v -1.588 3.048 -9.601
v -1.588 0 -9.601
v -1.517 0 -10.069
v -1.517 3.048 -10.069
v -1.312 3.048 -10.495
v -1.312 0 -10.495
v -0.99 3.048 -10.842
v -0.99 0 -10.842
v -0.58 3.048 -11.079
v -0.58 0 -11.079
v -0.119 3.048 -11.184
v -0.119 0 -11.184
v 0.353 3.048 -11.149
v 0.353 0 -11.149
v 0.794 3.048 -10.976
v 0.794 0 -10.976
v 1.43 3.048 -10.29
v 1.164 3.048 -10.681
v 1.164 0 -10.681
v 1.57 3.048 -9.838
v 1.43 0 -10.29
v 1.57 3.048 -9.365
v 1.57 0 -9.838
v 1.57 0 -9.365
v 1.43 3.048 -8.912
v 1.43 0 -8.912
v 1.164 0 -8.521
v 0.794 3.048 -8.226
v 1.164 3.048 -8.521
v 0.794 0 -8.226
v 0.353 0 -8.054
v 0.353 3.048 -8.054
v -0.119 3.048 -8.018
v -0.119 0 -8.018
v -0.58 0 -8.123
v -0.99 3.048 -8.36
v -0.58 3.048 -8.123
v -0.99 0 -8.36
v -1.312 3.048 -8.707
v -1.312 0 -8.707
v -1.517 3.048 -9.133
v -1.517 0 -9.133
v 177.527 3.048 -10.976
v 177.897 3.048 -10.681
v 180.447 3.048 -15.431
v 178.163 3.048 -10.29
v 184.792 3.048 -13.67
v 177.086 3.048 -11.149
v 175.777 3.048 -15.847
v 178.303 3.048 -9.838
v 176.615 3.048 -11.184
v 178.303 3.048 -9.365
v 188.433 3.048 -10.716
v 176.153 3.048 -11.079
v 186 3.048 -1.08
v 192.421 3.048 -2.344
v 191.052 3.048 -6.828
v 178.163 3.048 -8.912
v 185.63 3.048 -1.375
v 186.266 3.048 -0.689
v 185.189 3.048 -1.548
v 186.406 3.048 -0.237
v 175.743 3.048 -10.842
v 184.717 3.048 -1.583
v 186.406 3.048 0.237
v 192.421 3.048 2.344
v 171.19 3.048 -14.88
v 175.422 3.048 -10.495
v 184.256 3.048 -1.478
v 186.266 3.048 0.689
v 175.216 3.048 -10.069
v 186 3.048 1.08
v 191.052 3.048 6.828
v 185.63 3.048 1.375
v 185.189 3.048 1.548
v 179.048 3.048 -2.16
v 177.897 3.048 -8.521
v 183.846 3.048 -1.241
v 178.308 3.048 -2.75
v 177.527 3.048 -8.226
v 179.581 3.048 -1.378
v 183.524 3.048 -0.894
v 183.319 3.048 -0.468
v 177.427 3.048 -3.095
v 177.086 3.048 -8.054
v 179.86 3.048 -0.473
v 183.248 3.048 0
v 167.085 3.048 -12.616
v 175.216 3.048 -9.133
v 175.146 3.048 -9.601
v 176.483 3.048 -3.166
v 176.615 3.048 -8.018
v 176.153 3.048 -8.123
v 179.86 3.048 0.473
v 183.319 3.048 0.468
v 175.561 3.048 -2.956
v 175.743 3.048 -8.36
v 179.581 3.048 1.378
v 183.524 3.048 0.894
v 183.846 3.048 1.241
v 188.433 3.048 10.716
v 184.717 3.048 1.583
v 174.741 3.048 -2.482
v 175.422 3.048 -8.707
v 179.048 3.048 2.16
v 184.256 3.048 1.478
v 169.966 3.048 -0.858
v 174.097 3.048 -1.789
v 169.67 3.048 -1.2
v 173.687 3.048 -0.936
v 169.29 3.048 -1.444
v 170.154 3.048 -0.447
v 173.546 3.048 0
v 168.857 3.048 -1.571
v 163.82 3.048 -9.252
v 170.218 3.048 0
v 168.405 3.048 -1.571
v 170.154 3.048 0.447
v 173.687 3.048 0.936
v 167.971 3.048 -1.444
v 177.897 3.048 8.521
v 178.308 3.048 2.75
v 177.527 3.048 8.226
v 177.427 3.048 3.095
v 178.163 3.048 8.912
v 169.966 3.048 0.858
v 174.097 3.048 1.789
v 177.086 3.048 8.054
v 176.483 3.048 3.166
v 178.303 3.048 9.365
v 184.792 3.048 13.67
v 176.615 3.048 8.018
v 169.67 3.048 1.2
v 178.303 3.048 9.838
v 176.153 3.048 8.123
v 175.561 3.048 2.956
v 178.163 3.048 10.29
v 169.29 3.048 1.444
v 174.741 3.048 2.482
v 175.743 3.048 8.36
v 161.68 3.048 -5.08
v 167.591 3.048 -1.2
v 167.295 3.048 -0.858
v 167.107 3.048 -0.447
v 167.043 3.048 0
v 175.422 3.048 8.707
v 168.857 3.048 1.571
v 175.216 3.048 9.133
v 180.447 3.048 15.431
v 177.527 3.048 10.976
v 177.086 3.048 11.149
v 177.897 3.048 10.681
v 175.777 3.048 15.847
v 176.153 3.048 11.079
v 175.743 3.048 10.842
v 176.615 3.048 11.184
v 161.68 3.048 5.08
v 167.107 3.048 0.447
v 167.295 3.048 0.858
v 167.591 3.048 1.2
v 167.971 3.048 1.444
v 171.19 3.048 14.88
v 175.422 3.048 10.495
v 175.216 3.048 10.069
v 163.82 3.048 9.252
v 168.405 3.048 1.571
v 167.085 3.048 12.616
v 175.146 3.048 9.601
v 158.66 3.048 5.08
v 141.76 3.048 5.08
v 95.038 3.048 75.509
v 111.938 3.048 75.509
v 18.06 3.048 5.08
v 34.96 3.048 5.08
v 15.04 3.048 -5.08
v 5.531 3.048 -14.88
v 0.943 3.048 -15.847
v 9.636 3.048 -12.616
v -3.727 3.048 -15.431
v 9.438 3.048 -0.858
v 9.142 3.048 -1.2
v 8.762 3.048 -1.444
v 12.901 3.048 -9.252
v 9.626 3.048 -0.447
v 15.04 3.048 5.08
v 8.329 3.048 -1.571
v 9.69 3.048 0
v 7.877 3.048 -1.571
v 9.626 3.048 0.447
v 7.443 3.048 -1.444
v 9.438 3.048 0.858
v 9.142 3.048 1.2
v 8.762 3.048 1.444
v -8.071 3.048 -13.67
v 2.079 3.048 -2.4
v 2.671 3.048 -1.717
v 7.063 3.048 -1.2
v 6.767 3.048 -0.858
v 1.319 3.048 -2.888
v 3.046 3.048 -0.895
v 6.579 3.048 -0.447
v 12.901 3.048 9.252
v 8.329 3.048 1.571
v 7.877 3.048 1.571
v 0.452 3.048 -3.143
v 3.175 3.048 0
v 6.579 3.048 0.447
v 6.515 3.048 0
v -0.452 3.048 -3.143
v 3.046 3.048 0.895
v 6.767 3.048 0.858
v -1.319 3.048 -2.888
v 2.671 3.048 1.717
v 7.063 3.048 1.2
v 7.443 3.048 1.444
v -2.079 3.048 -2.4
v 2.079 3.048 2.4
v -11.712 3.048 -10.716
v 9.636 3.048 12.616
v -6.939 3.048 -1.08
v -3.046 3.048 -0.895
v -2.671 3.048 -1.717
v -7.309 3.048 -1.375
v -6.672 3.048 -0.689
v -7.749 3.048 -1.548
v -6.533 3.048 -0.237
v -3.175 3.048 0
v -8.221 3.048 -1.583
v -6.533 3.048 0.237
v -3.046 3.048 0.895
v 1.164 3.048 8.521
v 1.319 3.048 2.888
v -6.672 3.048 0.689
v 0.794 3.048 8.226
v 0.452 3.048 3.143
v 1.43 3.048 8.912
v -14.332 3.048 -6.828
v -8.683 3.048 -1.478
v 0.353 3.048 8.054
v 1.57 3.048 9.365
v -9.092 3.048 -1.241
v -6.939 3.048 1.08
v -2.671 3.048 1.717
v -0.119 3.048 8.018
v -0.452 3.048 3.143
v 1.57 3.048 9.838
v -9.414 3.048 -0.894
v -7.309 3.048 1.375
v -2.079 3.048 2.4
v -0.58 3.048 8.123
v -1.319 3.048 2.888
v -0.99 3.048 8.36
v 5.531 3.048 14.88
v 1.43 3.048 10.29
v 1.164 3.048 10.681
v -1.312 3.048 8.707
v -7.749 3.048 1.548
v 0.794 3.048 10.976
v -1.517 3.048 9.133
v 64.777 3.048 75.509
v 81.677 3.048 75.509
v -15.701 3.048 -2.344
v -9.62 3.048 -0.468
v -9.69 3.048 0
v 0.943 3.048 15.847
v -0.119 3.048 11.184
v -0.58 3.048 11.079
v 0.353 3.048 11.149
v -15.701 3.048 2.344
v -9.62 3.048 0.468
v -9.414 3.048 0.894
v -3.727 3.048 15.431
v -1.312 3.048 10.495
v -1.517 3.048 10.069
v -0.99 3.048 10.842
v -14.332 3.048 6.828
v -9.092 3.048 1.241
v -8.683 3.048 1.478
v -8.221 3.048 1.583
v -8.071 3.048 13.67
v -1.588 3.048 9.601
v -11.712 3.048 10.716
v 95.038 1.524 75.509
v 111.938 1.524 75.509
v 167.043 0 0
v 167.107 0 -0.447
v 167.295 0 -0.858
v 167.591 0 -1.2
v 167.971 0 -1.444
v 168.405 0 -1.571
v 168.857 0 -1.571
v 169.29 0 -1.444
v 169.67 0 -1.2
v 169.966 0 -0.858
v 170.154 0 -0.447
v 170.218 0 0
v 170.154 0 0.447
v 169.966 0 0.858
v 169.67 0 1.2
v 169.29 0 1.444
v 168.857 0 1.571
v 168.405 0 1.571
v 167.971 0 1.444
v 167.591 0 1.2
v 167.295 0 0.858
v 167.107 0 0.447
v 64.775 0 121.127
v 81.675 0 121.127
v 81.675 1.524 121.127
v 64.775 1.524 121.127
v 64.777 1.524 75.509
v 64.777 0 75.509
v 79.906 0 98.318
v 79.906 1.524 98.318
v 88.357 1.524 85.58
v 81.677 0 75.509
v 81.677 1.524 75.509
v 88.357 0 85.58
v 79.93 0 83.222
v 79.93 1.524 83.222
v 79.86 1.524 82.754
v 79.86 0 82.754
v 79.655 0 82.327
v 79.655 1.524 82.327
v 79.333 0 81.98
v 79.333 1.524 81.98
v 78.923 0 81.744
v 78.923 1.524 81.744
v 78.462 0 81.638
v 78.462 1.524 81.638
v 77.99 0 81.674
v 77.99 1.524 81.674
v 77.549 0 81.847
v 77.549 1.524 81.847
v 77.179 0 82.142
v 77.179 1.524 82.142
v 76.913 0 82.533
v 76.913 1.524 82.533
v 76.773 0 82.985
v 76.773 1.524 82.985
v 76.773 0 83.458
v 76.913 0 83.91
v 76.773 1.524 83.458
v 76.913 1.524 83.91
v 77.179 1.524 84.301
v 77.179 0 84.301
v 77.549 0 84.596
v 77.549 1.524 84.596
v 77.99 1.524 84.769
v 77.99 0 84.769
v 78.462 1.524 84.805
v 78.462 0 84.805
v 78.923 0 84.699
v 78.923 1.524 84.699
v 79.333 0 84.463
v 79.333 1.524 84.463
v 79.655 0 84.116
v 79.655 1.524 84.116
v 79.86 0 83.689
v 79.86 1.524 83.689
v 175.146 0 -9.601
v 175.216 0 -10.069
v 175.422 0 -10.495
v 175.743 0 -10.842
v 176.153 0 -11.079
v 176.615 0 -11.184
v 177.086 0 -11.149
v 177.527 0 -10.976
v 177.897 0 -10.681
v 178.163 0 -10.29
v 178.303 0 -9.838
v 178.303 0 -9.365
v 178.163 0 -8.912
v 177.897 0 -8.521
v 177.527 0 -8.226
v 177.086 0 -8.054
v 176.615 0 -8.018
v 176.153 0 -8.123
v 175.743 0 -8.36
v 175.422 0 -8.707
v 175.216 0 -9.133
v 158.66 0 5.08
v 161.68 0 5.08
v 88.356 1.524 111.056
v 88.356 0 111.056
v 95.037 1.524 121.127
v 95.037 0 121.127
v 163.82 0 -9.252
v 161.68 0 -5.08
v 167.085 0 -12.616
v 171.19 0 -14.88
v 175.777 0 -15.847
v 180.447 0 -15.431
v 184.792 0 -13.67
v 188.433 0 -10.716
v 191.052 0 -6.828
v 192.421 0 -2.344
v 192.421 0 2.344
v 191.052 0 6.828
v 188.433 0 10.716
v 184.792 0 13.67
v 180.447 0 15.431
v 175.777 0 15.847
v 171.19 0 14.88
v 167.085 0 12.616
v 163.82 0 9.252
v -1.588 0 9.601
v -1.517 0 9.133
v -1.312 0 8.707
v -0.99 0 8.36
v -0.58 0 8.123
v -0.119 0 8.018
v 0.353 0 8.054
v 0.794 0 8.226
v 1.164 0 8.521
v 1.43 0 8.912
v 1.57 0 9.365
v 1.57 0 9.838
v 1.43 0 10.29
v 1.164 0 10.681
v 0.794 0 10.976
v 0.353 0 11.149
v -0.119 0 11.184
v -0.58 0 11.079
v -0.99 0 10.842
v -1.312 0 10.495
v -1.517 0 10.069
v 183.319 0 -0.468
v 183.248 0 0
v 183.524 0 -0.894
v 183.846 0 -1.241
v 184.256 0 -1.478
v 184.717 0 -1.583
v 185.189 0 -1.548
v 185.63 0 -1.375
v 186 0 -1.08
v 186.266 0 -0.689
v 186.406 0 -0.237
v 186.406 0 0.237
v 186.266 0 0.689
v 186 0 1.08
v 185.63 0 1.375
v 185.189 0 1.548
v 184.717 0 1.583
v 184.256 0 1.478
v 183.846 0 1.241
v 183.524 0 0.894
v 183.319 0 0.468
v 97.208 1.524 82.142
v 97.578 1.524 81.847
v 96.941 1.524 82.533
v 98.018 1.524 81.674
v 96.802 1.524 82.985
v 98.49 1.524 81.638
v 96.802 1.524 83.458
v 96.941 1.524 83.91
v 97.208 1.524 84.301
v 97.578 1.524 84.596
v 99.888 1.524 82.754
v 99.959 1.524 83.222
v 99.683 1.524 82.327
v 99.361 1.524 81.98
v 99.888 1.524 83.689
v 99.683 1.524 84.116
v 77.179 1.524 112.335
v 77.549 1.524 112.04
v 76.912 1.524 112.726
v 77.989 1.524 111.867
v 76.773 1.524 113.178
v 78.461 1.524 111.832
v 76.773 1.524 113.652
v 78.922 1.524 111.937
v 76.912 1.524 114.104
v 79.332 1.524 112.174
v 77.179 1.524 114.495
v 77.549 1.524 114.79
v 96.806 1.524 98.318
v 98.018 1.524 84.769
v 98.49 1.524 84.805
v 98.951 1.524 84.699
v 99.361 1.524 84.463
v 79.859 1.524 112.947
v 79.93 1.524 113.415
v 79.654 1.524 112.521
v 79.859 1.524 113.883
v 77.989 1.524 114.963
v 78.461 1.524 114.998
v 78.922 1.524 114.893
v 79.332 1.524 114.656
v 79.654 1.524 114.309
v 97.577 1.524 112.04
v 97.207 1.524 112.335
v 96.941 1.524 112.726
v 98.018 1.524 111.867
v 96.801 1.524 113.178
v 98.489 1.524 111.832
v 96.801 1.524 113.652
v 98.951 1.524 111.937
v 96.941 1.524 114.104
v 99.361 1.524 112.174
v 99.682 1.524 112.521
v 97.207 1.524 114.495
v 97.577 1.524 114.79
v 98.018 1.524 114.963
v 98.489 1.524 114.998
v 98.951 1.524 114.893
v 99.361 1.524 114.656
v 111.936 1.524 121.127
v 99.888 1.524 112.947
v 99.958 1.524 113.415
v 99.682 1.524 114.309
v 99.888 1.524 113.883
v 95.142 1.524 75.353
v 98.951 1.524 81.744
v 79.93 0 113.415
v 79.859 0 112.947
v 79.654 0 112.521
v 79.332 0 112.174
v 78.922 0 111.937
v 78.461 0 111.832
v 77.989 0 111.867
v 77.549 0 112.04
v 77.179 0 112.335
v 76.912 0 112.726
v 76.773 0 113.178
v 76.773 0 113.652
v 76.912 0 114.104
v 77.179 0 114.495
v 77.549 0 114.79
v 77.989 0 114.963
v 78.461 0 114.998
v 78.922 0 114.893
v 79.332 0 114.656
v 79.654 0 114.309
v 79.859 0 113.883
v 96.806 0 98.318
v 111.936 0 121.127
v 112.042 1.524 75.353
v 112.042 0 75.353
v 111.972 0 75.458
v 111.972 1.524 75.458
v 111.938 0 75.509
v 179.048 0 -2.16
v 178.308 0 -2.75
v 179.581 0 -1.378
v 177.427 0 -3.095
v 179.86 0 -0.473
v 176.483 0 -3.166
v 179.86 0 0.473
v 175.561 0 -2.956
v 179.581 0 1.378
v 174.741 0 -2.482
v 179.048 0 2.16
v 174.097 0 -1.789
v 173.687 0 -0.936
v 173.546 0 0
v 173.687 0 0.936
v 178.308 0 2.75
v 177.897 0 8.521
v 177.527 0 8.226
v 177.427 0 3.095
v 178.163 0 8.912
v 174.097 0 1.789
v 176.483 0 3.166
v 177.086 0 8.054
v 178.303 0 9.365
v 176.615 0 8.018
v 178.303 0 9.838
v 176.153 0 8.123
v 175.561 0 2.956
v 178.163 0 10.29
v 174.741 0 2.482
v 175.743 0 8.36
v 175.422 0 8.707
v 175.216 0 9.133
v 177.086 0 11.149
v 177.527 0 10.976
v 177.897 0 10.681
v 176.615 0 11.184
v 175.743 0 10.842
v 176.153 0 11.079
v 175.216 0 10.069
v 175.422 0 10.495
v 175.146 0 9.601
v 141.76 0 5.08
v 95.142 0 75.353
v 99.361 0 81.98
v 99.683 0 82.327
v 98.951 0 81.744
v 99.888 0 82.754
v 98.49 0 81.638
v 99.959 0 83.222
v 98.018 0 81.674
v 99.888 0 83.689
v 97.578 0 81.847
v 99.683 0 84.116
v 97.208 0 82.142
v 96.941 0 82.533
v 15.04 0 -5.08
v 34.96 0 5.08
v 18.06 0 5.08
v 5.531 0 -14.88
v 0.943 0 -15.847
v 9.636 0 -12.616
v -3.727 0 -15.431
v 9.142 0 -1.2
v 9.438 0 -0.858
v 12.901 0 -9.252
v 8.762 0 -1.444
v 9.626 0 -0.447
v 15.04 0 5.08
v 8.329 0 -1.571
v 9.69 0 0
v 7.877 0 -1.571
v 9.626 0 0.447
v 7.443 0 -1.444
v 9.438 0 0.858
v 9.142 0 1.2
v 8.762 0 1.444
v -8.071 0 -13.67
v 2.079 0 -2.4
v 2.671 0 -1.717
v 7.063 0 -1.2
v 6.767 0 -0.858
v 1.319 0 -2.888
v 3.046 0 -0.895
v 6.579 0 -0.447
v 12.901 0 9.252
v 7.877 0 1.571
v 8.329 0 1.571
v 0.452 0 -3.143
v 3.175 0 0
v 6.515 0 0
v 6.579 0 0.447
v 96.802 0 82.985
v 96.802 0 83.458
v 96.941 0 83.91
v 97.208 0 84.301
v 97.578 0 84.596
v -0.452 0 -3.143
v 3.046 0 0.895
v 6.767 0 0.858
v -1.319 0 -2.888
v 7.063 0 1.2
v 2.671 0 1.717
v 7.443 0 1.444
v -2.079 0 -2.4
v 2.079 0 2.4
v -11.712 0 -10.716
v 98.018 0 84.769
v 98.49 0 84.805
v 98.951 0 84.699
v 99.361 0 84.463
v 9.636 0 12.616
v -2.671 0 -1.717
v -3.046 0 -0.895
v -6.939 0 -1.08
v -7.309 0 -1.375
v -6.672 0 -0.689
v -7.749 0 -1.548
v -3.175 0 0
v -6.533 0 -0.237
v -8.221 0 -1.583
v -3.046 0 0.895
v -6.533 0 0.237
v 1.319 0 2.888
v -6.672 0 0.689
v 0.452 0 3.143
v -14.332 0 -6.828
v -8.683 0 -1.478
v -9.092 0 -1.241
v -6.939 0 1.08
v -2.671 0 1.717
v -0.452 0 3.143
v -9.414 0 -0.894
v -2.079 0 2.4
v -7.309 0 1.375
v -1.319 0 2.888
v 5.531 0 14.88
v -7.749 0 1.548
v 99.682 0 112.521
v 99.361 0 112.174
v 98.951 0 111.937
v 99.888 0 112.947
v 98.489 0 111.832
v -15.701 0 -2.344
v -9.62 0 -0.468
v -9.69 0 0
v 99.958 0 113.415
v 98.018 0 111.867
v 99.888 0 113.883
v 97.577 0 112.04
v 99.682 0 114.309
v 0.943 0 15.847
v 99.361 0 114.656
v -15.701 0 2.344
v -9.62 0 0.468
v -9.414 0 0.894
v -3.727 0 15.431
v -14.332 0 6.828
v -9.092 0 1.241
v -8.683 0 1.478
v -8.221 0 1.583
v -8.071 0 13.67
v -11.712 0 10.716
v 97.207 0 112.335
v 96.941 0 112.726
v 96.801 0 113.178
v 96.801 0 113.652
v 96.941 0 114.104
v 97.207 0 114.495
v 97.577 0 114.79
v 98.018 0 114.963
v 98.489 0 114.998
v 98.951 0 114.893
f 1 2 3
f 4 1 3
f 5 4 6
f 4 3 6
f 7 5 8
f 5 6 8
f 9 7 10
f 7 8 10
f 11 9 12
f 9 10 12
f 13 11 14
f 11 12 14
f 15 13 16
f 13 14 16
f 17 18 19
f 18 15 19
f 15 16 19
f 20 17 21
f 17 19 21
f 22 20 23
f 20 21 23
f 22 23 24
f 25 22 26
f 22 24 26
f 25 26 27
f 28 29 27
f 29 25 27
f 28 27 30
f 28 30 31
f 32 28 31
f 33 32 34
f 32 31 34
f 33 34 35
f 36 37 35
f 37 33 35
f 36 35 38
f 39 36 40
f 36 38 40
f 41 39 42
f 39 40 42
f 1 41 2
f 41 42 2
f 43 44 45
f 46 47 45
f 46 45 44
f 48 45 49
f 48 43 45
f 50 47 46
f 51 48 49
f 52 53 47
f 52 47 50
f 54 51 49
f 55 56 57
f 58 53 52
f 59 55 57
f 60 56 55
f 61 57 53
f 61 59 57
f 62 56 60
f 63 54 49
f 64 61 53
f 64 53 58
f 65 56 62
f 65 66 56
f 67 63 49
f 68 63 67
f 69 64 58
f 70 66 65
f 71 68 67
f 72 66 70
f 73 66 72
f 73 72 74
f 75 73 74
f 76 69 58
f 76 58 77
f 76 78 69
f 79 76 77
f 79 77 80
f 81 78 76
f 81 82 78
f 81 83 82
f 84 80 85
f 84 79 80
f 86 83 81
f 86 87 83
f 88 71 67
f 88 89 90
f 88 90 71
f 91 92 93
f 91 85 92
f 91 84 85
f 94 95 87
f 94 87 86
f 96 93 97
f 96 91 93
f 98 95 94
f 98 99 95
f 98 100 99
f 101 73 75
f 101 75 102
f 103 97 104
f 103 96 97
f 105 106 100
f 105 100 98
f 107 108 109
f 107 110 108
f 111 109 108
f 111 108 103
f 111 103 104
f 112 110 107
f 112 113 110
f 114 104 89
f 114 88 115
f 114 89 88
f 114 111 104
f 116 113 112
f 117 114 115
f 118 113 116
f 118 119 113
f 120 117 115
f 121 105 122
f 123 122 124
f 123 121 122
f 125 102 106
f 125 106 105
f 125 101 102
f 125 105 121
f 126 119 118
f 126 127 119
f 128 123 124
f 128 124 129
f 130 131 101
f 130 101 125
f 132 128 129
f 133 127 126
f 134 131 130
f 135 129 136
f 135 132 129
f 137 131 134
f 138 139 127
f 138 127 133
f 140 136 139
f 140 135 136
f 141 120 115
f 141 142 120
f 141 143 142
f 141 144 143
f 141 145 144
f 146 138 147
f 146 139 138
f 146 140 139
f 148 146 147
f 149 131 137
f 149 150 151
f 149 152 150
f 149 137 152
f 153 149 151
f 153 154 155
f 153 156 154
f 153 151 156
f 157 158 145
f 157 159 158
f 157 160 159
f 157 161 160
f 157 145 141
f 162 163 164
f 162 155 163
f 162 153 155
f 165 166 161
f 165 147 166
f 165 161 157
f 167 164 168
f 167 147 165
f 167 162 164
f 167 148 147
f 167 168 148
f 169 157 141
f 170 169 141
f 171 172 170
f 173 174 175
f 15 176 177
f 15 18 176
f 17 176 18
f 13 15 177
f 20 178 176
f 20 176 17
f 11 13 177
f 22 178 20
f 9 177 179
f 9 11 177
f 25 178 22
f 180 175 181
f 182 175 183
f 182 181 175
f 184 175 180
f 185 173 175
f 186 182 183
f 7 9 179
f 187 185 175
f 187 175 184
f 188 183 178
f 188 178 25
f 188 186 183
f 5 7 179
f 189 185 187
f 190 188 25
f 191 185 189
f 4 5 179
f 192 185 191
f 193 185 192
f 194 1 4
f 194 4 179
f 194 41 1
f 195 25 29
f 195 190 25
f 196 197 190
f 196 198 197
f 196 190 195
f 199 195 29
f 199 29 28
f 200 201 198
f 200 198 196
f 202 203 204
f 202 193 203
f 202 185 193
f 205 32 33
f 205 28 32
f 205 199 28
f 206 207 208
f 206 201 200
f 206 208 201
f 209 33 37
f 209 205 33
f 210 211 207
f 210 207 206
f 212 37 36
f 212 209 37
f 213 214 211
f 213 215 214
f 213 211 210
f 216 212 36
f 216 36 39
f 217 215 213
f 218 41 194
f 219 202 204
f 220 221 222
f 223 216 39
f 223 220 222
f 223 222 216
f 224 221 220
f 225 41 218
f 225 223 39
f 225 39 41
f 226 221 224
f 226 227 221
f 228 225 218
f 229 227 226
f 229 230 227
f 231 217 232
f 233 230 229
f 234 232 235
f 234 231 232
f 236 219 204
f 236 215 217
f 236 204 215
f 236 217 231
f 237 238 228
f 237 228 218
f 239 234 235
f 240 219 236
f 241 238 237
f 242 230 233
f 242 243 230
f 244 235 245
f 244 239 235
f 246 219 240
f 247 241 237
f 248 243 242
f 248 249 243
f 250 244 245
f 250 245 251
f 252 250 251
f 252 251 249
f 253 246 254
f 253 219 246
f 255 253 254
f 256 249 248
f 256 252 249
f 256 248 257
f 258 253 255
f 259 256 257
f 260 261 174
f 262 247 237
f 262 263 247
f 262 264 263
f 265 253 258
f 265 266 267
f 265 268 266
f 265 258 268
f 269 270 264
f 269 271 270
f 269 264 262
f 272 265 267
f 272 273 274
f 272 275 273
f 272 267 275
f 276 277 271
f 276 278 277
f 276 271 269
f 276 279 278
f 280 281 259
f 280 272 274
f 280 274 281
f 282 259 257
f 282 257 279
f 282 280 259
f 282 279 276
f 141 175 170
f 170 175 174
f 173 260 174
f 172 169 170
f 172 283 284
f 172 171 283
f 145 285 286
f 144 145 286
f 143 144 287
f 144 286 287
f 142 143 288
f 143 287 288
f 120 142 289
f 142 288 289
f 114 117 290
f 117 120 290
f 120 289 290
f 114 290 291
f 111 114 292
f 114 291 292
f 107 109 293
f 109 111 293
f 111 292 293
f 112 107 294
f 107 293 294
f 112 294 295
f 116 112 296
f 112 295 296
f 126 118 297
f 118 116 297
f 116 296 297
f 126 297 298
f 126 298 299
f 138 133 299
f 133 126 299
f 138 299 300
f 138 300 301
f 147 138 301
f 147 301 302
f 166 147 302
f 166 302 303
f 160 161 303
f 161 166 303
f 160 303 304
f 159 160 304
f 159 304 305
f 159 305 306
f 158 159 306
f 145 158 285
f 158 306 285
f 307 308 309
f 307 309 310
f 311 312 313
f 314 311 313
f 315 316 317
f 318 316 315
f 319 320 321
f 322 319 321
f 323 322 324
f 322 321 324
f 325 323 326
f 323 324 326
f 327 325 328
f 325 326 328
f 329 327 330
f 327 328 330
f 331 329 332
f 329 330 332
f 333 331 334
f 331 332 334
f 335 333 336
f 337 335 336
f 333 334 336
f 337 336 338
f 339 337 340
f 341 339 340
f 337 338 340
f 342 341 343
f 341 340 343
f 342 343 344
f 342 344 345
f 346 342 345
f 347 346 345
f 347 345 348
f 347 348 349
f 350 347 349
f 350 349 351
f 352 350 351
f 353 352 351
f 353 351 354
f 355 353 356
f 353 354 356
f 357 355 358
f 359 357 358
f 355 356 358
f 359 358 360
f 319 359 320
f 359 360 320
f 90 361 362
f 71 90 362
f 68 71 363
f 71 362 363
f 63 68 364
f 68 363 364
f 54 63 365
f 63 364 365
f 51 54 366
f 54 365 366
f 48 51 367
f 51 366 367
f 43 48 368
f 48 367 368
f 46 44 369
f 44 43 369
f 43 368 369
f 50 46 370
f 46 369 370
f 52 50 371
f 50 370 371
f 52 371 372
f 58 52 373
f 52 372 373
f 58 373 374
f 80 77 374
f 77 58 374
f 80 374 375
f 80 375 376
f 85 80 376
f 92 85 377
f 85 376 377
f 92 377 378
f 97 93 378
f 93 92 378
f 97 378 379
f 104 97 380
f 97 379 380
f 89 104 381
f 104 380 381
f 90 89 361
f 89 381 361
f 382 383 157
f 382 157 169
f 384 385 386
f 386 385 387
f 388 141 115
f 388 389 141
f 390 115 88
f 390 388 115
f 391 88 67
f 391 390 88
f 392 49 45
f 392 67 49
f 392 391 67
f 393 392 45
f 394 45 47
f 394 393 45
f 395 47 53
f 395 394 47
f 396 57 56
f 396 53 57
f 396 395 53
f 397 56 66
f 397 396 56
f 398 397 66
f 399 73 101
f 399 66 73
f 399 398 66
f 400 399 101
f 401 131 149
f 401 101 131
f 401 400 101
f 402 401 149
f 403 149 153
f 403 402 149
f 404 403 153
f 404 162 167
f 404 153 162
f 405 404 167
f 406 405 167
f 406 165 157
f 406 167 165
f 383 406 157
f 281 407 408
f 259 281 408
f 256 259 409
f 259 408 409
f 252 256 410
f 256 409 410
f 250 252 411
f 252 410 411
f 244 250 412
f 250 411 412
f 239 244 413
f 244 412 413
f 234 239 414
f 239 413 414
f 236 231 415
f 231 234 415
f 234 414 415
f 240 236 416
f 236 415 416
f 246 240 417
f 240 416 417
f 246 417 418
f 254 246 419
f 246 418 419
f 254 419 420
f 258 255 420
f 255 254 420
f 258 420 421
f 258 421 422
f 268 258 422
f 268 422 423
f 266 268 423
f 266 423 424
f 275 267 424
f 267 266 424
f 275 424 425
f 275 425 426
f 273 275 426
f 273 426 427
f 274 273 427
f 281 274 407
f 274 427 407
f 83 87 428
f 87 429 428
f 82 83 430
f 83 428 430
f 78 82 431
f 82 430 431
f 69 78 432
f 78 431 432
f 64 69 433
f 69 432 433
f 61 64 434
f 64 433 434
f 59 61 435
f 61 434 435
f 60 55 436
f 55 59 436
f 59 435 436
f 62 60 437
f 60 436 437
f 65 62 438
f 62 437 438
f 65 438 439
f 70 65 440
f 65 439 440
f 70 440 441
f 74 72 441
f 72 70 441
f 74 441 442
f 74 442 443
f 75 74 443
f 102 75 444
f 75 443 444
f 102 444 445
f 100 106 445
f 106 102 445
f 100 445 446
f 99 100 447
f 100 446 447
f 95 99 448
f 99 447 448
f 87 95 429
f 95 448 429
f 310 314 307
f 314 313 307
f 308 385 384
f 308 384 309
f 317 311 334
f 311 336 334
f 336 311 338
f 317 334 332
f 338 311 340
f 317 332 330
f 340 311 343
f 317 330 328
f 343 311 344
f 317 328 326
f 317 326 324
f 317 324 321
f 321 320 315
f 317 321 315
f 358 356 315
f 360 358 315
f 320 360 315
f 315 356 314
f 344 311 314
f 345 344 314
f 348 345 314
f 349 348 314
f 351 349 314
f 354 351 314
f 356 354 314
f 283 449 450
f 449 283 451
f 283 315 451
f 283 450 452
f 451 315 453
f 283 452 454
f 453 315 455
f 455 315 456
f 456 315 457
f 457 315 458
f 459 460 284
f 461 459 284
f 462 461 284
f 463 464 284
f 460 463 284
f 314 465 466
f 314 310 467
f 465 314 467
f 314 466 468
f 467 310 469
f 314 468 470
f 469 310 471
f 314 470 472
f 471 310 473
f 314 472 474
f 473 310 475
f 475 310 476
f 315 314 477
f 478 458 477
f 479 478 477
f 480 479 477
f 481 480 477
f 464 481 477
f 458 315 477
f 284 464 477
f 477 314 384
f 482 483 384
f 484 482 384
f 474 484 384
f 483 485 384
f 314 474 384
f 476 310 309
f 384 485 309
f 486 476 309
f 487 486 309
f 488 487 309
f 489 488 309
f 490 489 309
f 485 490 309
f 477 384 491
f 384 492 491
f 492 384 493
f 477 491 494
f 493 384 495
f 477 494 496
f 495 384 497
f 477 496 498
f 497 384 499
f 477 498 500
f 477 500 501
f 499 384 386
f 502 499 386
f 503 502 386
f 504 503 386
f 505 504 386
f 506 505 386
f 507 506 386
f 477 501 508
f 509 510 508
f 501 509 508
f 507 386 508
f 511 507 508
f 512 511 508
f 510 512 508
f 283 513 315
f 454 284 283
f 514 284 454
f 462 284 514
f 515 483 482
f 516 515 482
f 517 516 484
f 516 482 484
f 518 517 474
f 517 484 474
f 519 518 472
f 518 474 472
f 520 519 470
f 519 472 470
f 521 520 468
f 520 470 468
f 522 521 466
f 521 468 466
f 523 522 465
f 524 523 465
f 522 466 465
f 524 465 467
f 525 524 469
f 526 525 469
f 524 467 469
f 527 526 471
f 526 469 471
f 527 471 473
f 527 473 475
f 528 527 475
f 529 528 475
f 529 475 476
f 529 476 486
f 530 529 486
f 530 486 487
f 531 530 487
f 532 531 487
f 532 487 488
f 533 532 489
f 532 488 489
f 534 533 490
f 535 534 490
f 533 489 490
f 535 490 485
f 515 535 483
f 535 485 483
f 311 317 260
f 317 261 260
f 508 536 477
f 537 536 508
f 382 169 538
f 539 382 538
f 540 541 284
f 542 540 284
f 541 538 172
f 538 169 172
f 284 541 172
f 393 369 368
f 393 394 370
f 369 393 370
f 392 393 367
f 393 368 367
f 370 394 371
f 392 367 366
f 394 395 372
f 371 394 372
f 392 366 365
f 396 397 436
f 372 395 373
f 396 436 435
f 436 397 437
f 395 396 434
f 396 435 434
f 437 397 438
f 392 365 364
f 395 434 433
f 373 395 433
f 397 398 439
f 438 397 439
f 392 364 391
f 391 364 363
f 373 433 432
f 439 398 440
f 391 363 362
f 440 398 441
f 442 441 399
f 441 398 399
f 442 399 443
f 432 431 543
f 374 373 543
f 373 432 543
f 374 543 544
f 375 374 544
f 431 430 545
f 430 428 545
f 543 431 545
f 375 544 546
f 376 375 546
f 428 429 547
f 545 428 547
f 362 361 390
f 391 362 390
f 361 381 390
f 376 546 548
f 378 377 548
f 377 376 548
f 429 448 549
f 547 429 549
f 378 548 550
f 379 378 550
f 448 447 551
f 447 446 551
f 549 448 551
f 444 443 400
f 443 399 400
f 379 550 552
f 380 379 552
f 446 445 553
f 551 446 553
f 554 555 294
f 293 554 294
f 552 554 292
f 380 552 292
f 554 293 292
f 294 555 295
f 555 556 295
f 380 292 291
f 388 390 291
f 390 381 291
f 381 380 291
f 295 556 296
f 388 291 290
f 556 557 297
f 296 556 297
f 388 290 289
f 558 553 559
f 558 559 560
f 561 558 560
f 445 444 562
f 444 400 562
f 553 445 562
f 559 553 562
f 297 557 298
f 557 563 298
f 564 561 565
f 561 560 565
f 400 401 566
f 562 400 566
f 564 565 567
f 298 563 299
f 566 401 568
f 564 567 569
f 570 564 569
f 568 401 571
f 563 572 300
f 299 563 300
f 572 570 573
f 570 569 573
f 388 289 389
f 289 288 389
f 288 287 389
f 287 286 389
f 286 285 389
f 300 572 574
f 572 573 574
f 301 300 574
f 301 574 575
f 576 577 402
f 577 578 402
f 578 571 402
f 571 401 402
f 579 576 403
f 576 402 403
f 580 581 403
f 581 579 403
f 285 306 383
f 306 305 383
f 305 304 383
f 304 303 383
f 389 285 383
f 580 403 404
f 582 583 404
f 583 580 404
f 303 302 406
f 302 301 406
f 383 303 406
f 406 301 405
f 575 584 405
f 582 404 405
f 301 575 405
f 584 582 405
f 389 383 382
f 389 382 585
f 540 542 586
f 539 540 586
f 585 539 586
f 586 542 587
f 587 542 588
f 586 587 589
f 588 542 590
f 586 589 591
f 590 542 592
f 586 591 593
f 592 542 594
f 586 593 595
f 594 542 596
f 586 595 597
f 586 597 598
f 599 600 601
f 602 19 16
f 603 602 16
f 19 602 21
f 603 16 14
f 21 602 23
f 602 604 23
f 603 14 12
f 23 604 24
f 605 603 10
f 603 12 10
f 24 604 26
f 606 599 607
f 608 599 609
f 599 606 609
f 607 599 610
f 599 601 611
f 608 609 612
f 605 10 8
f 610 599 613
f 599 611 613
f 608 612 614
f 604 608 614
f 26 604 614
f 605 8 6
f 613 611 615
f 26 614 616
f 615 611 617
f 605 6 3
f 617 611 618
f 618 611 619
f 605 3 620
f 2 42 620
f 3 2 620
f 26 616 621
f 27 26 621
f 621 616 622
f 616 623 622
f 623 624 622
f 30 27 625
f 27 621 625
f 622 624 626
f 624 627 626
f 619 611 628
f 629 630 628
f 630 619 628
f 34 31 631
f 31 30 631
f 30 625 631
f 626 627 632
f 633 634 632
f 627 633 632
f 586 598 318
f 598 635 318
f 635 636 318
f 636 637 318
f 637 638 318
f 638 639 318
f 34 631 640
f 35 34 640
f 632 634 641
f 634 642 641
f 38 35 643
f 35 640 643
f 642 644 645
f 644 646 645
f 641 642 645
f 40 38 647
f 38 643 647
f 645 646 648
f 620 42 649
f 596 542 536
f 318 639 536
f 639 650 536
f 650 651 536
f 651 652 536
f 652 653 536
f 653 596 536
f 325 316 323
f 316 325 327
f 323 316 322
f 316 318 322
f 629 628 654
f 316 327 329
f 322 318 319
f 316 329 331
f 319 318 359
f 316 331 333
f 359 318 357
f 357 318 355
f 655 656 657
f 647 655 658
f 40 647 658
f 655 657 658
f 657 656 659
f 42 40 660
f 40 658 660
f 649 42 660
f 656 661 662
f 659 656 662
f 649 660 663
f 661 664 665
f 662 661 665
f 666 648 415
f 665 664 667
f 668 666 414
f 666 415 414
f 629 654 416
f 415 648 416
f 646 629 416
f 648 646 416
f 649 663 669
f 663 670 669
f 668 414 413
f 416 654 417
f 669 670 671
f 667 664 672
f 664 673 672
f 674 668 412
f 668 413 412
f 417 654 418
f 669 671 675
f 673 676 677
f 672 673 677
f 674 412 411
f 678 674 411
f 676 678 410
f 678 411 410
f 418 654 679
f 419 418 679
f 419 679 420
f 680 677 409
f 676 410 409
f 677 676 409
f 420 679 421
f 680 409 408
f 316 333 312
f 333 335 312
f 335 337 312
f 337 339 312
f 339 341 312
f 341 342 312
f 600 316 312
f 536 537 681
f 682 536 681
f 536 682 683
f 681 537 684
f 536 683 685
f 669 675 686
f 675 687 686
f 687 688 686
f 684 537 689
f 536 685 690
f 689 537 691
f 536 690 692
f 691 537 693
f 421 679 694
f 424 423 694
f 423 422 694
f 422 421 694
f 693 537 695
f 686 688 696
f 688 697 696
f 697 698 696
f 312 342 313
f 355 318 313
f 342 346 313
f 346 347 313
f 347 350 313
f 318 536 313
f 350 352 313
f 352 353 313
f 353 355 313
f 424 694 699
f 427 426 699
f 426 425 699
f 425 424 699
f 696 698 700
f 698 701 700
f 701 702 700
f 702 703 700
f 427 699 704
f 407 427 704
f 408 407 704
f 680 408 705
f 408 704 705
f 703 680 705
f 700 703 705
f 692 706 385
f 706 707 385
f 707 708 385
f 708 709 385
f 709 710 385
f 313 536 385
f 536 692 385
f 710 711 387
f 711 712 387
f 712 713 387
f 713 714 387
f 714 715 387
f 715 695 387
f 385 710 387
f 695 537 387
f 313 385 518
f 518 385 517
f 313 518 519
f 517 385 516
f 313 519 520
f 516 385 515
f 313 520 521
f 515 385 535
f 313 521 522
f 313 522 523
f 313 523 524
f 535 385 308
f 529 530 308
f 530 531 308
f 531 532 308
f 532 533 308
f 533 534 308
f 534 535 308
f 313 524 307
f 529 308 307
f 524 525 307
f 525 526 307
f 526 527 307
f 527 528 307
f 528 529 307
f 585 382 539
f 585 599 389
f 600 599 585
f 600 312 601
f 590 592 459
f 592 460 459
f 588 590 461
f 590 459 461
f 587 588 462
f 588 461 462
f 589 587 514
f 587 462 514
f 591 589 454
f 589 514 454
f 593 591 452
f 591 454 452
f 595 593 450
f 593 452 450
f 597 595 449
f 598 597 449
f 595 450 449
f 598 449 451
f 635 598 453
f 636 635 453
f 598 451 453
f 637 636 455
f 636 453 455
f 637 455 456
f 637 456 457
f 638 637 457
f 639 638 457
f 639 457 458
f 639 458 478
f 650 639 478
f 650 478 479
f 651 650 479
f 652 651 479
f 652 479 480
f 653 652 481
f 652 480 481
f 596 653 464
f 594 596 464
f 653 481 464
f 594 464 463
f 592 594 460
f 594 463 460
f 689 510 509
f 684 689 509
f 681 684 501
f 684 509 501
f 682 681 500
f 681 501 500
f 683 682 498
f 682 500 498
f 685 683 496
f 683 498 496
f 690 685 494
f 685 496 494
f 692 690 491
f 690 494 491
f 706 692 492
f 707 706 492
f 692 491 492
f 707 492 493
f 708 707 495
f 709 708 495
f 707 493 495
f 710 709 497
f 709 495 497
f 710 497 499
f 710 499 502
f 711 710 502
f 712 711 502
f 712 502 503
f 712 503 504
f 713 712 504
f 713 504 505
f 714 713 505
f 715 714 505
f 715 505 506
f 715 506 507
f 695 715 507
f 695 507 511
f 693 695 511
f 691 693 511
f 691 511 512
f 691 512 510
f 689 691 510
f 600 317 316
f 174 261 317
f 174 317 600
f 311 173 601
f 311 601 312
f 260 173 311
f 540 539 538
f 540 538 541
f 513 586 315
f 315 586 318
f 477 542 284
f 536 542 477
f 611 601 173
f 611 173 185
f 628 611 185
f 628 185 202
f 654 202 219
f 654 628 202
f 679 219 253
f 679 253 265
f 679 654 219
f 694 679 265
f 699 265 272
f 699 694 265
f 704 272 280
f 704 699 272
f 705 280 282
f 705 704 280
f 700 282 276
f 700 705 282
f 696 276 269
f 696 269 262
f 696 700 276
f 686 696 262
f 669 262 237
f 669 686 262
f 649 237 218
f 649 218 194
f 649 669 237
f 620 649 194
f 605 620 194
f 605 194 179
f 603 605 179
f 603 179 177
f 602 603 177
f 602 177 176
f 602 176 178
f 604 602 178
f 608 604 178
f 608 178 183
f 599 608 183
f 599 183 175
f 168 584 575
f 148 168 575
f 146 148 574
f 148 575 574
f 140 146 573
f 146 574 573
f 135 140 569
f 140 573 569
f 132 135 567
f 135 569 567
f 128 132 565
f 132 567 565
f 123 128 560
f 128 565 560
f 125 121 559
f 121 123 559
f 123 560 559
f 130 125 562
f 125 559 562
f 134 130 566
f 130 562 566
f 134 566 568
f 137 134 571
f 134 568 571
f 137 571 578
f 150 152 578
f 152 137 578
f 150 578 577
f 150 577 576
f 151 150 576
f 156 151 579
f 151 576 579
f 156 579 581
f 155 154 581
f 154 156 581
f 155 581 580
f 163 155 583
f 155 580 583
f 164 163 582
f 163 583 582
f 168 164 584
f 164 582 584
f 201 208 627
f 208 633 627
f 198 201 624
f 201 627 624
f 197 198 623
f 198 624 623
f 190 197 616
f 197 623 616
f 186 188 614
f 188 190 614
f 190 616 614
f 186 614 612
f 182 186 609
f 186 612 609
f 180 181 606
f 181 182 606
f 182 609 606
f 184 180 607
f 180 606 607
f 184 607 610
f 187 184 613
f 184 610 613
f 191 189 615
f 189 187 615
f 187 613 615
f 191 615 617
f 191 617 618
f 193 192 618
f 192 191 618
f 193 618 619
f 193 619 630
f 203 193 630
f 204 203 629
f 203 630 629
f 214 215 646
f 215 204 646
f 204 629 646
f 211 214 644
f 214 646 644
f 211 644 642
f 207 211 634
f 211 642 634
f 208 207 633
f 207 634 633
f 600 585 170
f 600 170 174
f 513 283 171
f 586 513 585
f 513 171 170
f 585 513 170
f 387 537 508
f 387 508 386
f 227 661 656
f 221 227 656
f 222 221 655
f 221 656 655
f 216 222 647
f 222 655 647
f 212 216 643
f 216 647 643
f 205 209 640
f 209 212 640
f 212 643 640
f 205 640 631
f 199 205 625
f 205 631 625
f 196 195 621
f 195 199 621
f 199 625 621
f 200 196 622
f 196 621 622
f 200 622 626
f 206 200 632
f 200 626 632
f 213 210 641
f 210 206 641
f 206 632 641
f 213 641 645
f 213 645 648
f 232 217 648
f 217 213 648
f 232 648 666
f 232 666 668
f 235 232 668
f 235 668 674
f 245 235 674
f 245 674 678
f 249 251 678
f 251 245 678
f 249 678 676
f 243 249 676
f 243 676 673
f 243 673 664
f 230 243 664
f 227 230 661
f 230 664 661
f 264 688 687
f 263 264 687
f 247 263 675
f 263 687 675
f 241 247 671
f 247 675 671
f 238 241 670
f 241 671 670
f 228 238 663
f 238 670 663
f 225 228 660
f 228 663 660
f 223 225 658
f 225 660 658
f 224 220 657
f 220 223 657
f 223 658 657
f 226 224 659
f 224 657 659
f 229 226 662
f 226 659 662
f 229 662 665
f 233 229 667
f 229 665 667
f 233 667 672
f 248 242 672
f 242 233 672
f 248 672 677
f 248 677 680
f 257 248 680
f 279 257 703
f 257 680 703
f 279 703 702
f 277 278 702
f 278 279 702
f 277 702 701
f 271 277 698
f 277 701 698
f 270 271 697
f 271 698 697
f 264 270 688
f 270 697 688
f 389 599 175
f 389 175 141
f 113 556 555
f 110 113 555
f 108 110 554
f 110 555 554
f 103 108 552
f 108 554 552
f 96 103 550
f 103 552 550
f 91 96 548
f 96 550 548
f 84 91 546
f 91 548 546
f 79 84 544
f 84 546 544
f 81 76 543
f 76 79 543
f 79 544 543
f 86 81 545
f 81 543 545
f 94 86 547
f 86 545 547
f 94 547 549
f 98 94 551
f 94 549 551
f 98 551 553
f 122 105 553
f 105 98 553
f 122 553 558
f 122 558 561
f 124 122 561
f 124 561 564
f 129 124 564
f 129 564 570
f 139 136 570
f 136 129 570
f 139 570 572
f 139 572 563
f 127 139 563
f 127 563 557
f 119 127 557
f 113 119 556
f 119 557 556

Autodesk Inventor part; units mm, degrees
ref_plane "YZ Plane" through (0, 0, 0) normal (1, 0, 0) x (0, 1, 0)
ref_plane "XZ Plane" through (0, 0, 0) normal (0, 1, 0) x (-1, 0, 0)
sketch "Sketch1" plane through (0, 0, 0) normal (0, 1, 0) x (-1, 0, 0)
  circle A0 centre (0, 0) radius 3.175
  circle A1 centre (0, -9.6012) radius 1.5875
  circle A2 centre (8.1026, 0) radius 1.5875
  circle A3 centre (0, 9.6012) radius 1.5875
  circle A4 centre (-8.1026, 0) radius 1.5875
  circle A5 centre (0, 0) radius 15.875
  circle A6 centre (-176.7205, 0) radius 3.175
  circle A7 centre (-176.7332, -9.6012) radius 1.5875
  circle A8 centre (-184.8358, 0) radius 1.5875
  circle A9 centre (-176.7332, 9.6012) radius 1.5875
  circle A10 centre (-168.6306, 0) radius 1.5875
  circle A11 centre (-176.7205, 0) radius 15.875
  line L0 (-163.5506, 5.08) -> (-13.1826, 5.08)
  line L1 (-13.1826, 5.08) -> (-13.1826, -5.08)
  line L2 (-13.1826, -5.08) -> (-163.5506, -5.08)
  line L3 (-163.5506, -5.08) -> (-163.5506, 5.08)
  line L4 (0, 0) -> (-163.5506, 0)
  line L5 (-170.2181, 0) -> (-176.7078, 0)
  line L6 (-176.7205, 0) -> (-170.2181, 0)
  line L7 (-167.0431, 0) -> (-0.0127, 0)
  line L8 (-176.7078, 0) -> (-170.2181, 0)
  line L9 (-167.0431, 0) -> (-88.3666, 0)
  point P0 (-161.6802, -5.08)
  point P1 (-15.0403, -5.08)
  point P2 (-15.0403, 5.08)
  point P3 (-161.6802, 5.08)
  dimension "d0" = 6.35
  dimension "d1" = 3.175
  dimension "d2" = 3.175
  dimension "d3" = 3.175
  dimension "d4" = 3.175
  dimension "d5" = 9.6012
  dimension "d6" = 8.1026
  dimension "d7" = 8.1026
  dimension "d8" = 9.6012
  dimension "d9" = 31.75
  dimension "d14" = 5.08
  dimension "d15" = 5.08
  dimension "d16" = 5.08
  dimension "d17" = 5.08
  dimension "d50" = 176.7078
extrude "Extrusion1" add sketch "Sketch1" along normal blind 3.048
ref_plane "Work Plane1" through (15.0403, 0, 98.425) normal (0, 0, 1) x (1, 0, 0)
mirror "Mirror1" [suppressed]
sketch "Sketch2" plane through (0, 3.048, 0) normal (0, 1, 0) x (1, 0, 0)
  arc A0 (15.0403, 5.08) -> (15.0403, -5.08) centre (0, 0) ccw projected
  line L0 (158.3147, -191.0461) -> (27.7403, 5.8039)
  arc A1 (161.6802, -5.08) -> (161.6802, 5.08) centre (176.7205, 0) ccw projected
  line L1 (18.143, -191.4206) -> (148.9802, 5.8039)
  line L2 (17.5803, -4.3561) -> (147.9282, -200.8645)
  line L3 (161.6802, -5.08) -> (159.1402, -5.08)
  line L4 (159.1402, -4.3561) -> (28.303, -201.5806)
  line L5 (95.3776, -74.9969) -> (112.2777, -74.9969)
  line L6 (81.337, -74.9969) -> (64.4377, -74.9969)
  line L7 (95.0379, -75.509) -> (111.9379, -75.509)
  line L8 (81.6767, -75.509) -> (64.7774, -75.509)
  line L9 (96.8065, -99.0548) -> (79.9064, -99.0548)
  line L10 (88.3569, -86.3038) -> (88.3569, -85.5799)
  line L11 (161.6802, 5.08) -> (15.0403, 5.08) projected
  line L12 (88.3569, -86.3038) -> (89.0808, -86.3038) construction
  line L13 (81.1864, -121.864) -> (64.2863, -121.864)
  line L14 (95.5256, -121.864) -> (112.4249, -121.864)
  line L15 (15.0403, -5.08) -> (161.6802, -5.08) projected
  line L16 (34.9598, -5.08) -> (18.0604, -5.08)
  line L17 (141.7599, -5.08) -> (159.1402, -5.08)
  point P0 (79.9068, -98.3176)
  point P1 (88.3564, -111.0559)
  point P2 (96.8065, -98.3182)
  point P3 (88.3569, -85.5799)
  point P4 (64.5631, -75.9099)
  point P5 (81.4625, -75.9099)
  point P6 (95.0379, -75.509)
  point P7 (158.66, -5.08)
  point P8 (141.7599, -5.08)
  dimension "d69" = 23.5458
  dimension "d70" = 23.5458
  dimension "d81" = 90
  dimension "d82" = 22.8092
  dimension "d83" = 22.8092
extrude "Extrusion2" add sketch "Sketch2" against normal blind 3.048 contours L15 L0 L6 L2 | L6 L0 L8 L2 | L15 L4 L5 L1 | L5 L4 L7 L1
sketch "Sketch3" plane through (0, 0, 0) normal (0, -1, 0) x (1, 0, 0)
  line L0 (34.9598, 5.08) -> (81.6767, 75.509) projected
  line L1 (64.7774, 75.509) -> (18.0604, 5.08) projected
  line L2 (18.0604, 5.08) -> (159.8416, 218.8249)
  line L3 (15.0403, 5.08) -> (161.6802, 5.08) projected
  line L4 (34.9598, 5.08) -> (173.1628, 213.4305)
  line L5 (15.0403, 5.08) -> (161.6802, 5.08) projected
  line L6 (158.66, 5.08) -> (122.9182, 58.9573)
  line L7 (158.66, 5.08) -> (111.9379, 75.509) projected
  line L8 (158.66, 5.08) -> (25.1448, 206.3412)
  line L9 (141.7599, 5.08) -> (8.7682, 205.5521)
  line L10 (95.3776, 74.9969) -> (112.2777, 74.9969) projected
  line L11 (112.162, 75.4579) -> (95.2201, 75.4579)
  line L12 (64.4377, 74.9969) -> (81.337, 74.9969) projected
  line L13 (81.337, 75.7208) -> (64.4377, 75.7208)
  line L14 (81.675, 121.1274) -> (64.775, 121.1274)
  line L15 (111.9363, 121.1274) -> (95.037, 121.1274)
  line L16 (64.7774, 75.509) -> (81.6767, 75.509)
  line L17 (95.1415, 75.3529) -> (112.0415, 75.3529)
  line L18 (79.9064, 98.3182) -> (96.8065, 98.3182)
  point P0 (0, 0)
  point P1 (18.0604, 5.08)
  point P2 (141.7599, 5.08)
  point P3 (173.1628, 213.4305)
  point P4 (8.7682, 205.5521)
  point P5 (81.337, 74.9969)
  point P6 (88.3569, 85.5799)
  point P7 (112.2777, 74.9969)
  point P8 (96.6135, 98.7512)
  point P9 (88.3564, 111.0559)
  point P10 (79.9068, 98.3176)
  point P11 (95.3776, 74.9969)
  point P12 (81.4625, 75.9099)
  point P13 (64.5631, 75.9099)
  point P14 (111.9379, 75.509)
  dimension "d58" = 22.8092
  dimension "d64" = 22.8092
  dimension "d65" = 22.8092
  dimension "d67" = 22.9653
extrude "Extrusion3" add sketch "Sketch3" against normal blind 1.524 contours L16 L2 L9 L4 | L9 L18 L4 | L4 L8 L7 L17 L9 | L8 L2 L15 L4 | L18 L2 L8 | L9 L14 L8 L2
sketch "Sketch4" plane through (0, 1.524, 0) normal (0, 1, 0) x (1, 0, 0)
  line L0 (111.9363, -121.1274) -> (96.8065, -98.3182) projected
  line L1 (79.9068, -98.3176) -> (64.775, -121.1274) projected
  line L2 (158.66, -5.08) -> (96.8065, -98.3182) projected
  line L3 (88.3564, -111.0559) -> (95.037, -121.1274) projected
  line L4 (96.8065, -98.3182) -> (88.3564, -111.0559) projected
  line L5 (96.8065, -98.3182) -> (88.3569, -85.5799) projected
  line L6 (88.3569, -85.5799) -> (88.3564, -111.0559)
  line L7 (79.9068, -98.3176) -> (88.3564, -111.0559) projected
  line L8 (96.8065, -98.3182) -> (79.9068, -98.3176)
  line L9 (88.3566, -98.3179) -> (78.3429, -83.2215)
  line L10 (88.3569, -85.5799) -> (96.8065, -98.3182) projected
  line L11 (88.3566, -98.3179) -> (98.3715, -83.2215)
  line L12 (95.0379, -75.509) -> (88.3569, -85.5799) projected
  line L13 (78.3429, -83.2215) -> (98.3715, -83.2215)
  line L14 (78.3429, -83.2215) -> (96.1304, -110.0373)
  line L15 (98.3715, -83.2215) -> (80.5501, -110.0856)
  circle A0 centre (88.3566, -98.3179) radius 18.1163
  line L16 (88.3566, -98.3179) -> (98.3708, -113.4149)
  line L17 (88.3566, -98.3179) -> (78.3425, -113.4149)
  circle A1 centre (78.3429, -83.2215) radius 1.5875
  circle A2 centre (98.3715, -83.2215) radius 1.5875
  circle A3 centre (98.3708, -113.4149) radius 1.5875
  circle A4 centre (78.3425, -113.4149) radius 1.5875
  point P0 (0, 0)
  point P1 (87.8755, -85.578)
  point P2 (87.8599, -111.6467)
  point P3 (111.9412, -75.1032)
  point P4 (64.2633, -75.4579)
  point P5 (112.162, -75.4579)
  point P6 (34.9598, -5.08)
  point P7 (18.0604, -5.08)
  point P8 (81.1626, -75.4579)
  point P9 (95.2356, -75.4579)
  point P10 (95.1415, -76.0768)
  point P11 (81.6767, -76.2329)
  point P12 (64.5631, -75.9099)
  point P13 (64.7549, -76.199)
  point P14 (112.2777, -74.9969)
  dimension "d74" = 3.175
  dimension "d75" = 3.175
  dimension "d76" = 3.175
  dimension "d77" = 3.175
  dimension "d78" = 33.559
  dimension "d79" = 33.558
extrude "Extrusion4" cut sketch "Sketch4" against normal blind 3.81 contours A3 A0 | A0 L16 A3 | A0 A3 L16 | A2 L11 A0 | A0 A2 | A2 L13 L11 | A1 A0 L9 | L9 L13 A1 | L13 A2 A0 | A0 A1 L13 | A0 A1 | A4 A0 | A0 L17 A4 | A4 L17 A0
properties part number "crossBraces"
